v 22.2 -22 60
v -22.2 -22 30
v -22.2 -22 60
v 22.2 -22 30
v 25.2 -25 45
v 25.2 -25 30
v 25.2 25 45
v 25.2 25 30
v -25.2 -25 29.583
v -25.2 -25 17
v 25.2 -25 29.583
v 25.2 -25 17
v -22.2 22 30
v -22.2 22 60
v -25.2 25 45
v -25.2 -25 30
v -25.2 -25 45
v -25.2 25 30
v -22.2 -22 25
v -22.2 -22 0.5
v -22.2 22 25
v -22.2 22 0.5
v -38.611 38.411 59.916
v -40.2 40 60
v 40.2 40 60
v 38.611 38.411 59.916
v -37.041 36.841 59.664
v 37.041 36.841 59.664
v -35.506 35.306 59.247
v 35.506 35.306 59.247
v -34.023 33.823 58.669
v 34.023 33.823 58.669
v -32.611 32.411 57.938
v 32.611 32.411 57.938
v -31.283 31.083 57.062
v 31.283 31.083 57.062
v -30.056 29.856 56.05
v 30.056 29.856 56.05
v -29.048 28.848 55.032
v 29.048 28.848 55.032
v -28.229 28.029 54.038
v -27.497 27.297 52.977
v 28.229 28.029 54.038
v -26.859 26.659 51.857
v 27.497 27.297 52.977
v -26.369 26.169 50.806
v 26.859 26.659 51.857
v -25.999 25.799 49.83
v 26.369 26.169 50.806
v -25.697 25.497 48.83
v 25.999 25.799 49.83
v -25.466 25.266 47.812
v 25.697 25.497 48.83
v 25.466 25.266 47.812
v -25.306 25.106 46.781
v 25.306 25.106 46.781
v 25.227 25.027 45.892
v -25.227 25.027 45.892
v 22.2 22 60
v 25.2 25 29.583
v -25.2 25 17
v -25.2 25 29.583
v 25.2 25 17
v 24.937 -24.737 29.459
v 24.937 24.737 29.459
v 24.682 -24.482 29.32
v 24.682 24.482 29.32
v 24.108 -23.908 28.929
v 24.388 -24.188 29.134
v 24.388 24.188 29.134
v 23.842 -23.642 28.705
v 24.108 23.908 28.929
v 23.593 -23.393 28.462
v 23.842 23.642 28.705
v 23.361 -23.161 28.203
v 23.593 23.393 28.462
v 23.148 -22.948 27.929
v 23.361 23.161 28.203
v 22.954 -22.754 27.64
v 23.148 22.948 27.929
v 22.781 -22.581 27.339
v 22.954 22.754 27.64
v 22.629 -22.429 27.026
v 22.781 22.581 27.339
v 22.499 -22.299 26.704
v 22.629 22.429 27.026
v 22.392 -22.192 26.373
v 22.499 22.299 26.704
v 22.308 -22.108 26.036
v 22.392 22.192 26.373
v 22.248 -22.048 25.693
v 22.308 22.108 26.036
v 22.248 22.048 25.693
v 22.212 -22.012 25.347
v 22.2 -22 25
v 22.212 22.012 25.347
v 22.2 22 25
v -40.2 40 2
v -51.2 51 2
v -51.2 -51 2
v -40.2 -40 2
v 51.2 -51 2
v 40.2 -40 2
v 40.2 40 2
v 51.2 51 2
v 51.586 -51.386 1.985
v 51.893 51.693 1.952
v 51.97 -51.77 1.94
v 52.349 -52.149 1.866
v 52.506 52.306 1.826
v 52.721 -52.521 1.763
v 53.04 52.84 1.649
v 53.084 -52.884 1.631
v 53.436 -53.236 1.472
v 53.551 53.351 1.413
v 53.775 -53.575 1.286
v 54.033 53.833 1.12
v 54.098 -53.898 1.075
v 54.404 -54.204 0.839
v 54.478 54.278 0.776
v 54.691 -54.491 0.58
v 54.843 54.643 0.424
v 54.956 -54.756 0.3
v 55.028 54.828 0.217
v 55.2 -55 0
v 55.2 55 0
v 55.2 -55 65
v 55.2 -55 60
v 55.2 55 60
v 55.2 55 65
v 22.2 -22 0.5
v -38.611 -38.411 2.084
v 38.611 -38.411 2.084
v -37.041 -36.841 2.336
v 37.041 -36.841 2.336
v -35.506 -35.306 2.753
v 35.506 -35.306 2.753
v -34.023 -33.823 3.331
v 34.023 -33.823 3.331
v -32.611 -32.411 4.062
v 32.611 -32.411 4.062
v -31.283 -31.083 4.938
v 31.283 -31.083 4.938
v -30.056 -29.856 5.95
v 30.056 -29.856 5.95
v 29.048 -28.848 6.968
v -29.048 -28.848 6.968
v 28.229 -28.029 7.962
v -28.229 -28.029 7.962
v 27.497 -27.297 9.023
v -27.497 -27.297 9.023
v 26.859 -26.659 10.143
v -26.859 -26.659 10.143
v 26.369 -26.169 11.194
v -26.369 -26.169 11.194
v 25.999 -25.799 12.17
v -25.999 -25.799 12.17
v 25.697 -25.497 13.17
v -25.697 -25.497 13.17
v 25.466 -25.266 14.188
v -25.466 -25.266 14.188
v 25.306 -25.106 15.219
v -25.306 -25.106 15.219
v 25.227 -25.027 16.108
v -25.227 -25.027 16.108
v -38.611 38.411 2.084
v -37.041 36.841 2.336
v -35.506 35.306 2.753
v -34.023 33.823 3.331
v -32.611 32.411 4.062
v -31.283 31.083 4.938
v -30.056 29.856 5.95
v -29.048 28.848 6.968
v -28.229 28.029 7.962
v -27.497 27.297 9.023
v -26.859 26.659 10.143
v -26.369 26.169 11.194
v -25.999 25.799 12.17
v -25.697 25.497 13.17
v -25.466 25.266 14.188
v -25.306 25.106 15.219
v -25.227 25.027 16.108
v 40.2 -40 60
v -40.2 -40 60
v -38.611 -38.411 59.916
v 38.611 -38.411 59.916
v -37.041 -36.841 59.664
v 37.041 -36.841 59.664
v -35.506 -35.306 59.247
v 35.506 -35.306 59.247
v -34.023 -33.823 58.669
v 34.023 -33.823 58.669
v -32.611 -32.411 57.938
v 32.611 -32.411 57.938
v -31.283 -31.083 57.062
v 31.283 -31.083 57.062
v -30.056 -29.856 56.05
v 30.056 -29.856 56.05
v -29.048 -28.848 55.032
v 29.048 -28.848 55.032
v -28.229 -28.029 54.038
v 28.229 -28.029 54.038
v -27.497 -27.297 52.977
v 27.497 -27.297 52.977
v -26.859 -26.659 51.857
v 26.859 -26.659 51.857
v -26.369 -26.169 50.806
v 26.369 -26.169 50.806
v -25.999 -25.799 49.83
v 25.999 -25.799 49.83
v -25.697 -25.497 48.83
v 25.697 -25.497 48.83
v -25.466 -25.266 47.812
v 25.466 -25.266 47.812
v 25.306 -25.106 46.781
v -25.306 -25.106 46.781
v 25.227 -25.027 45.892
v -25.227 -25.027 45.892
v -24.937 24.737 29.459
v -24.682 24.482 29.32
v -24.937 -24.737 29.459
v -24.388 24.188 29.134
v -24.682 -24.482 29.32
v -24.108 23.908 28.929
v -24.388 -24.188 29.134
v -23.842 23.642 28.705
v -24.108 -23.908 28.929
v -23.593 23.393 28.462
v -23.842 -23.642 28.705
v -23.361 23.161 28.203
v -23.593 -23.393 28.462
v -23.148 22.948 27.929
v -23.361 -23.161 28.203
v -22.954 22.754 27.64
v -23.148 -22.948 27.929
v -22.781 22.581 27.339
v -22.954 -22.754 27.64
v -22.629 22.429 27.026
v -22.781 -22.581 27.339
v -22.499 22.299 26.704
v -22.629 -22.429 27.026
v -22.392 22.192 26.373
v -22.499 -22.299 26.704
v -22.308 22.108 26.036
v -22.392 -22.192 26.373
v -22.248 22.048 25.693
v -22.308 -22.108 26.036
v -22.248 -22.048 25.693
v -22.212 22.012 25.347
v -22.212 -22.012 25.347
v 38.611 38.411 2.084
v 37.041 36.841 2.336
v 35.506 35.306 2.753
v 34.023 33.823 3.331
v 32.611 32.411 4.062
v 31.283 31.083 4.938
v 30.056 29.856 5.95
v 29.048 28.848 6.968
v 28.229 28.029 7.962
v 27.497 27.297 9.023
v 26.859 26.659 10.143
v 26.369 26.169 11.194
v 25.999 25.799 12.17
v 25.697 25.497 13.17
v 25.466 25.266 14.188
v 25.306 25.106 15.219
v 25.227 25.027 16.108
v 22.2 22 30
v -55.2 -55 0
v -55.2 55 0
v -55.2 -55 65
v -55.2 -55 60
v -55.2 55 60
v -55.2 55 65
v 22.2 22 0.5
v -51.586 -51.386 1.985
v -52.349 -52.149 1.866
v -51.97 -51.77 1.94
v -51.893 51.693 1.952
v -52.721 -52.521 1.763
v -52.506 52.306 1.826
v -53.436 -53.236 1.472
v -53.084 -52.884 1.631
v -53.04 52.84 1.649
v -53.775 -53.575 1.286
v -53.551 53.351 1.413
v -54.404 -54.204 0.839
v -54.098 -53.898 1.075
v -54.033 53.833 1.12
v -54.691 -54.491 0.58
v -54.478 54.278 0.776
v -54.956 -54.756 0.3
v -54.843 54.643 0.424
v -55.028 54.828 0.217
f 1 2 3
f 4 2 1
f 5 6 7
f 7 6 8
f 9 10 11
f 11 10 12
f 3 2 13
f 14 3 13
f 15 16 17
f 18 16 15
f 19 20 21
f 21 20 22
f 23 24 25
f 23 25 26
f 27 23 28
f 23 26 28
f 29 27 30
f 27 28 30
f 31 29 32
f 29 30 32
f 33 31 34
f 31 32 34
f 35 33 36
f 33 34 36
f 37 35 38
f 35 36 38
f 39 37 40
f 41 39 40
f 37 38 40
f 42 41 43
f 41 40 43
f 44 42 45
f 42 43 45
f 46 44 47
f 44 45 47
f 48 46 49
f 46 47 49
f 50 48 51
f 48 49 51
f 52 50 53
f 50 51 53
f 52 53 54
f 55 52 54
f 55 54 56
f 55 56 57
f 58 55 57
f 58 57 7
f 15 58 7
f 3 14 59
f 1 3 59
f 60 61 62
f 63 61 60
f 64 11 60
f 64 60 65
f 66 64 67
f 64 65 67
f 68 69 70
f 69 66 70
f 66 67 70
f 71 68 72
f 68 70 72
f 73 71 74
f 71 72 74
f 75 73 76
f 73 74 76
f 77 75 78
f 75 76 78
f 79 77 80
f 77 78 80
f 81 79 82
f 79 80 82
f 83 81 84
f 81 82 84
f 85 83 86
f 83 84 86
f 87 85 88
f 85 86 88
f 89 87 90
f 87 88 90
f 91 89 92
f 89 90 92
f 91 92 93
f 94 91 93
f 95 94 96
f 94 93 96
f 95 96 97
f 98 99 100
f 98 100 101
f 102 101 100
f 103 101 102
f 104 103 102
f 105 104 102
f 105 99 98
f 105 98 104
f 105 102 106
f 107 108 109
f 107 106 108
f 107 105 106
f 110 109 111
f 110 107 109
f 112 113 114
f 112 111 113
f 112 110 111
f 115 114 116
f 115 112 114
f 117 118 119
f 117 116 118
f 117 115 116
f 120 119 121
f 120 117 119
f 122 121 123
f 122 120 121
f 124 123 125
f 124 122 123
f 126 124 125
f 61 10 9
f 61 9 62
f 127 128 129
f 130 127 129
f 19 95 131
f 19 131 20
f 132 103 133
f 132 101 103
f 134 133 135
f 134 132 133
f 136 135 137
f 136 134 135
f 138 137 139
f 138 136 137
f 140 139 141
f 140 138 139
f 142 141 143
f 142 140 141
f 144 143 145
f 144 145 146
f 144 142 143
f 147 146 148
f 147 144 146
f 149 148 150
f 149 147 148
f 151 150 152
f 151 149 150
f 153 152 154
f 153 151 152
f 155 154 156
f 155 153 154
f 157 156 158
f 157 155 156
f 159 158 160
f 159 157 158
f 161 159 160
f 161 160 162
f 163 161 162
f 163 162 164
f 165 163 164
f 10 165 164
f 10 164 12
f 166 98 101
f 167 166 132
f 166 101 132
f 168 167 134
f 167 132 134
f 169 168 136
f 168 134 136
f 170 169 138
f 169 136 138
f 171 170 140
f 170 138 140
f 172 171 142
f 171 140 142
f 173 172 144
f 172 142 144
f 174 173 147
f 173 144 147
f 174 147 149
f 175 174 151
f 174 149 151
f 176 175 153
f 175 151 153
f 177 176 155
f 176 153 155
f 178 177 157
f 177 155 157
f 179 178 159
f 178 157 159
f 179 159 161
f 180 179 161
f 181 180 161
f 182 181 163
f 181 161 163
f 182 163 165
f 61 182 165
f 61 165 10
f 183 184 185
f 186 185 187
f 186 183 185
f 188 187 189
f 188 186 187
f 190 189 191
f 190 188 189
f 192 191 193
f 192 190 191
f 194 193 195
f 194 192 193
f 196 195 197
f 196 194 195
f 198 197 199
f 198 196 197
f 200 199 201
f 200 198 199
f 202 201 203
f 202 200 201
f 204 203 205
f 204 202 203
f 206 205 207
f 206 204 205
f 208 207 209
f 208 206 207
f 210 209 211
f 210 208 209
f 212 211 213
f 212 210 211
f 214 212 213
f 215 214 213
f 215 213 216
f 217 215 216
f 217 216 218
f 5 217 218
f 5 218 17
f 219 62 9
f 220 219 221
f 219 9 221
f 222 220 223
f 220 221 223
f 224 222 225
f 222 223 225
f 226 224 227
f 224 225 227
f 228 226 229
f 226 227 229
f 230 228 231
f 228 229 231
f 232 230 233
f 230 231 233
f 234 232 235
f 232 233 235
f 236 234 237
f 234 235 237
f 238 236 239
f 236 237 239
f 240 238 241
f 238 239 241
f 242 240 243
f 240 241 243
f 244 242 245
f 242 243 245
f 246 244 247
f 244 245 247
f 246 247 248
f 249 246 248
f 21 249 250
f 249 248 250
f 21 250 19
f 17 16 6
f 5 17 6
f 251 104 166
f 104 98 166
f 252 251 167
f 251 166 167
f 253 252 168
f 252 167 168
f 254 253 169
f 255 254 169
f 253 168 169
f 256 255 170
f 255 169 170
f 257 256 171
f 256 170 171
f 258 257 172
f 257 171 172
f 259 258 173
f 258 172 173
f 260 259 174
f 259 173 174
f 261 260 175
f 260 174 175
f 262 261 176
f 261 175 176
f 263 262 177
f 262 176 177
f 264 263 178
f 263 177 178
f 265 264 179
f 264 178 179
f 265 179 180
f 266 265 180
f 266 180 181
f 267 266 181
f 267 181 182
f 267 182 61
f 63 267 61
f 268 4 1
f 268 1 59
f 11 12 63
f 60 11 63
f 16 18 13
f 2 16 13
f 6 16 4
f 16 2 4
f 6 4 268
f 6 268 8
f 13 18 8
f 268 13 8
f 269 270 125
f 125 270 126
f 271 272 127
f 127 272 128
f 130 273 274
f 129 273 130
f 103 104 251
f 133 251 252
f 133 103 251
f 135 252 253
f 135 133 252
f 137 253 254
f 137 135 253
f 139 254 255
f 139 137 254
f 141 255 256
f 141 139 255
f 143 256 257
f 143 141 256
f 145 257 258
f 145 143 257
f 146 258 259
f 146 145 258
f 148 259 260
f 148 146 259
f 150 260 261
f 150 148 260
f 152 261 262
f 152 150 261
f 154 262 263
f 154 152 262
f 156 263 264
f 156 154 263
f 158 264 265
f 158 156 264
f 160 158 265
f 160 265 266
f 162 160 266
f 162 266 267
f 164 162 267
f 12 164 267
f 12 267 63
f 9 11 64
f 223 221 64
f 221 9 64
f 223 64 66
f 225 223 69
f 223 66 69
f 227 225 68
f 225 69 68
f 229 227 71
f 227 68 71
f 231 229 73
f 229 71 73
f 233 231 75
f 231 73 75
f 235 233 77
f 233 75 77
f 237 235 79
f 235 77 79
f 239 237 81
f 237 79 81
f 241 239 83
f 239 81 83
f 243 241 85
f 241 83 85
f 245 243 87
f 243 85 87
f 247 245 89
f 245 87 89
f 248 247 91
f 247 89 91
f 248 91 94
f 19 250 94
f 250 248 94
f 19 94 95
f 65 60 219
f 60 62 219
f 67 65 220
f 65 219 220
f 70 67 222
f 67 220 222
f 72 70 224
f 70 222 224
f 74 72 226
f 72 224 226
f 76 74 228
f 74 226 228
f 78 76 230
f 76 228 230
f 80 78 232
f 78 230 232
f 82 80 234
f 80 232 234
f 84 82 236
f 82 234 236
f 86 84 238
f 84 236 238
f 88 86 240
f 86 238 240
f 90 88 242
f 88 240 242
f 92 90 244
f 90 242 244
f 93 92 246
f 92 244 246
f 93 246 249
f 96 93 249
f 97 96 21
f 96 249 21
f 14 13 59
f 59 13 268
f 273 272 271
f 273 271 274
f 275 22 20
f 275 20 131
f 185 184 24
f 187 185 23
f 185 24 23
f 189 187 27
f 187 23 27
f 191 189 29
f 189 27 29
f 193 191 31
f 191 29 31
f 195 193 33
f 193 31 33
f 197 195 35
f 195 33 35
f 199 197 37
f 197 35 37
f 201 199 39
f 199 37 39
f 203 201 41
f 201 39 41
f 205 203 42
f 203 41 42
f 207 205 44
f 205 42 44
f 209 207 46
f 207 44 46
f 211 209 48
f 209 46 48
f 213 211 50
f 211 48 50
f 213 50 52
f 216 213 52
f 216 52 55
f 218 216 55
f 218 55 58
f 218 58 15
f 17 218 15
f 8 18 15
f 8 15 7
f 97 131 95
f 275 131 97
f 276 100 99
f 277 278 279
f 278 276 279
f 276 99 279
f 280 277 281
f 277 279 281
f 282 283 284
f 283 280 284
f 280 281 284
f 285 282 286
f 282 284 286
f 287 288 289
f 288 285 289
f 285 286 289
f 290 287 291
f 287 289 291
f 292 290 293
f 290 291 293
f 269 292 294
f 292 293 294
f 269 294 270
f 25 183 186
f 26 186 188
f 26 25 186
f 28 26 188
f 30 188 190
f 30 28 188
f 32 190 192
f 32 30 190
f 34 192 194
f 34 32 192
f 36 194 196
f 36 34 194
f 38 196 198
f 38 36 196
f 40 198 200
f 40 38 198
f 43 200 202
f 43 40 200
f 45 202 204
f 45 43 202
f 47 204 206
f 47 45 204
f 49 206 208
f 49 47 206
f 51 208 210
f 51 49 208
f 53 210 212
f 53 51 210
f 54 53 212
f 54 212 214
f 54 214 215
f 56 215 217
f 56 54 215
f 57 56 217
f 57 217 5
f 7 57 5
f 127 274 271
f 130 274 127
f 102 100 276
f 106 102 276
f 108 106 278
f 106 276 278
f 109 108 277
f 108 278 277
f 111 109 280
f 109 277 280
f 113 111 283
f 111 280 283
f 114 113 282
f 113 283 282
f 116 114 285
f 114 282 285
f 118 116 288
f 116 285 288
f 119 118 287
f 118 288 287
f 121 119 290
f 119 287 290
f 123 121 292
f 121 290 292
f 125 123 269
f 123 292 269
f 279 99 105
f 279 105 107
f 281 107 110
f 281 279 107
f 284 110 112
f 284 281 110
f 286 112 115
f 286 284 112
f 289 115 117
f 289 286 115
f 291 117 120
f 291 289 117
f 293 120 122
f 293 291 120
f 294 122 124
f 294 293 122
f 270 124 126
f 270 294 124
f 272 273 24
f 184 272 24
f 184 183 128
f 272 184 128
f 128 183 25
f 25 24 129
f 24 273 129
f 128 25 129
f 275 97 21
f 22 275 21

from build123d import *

# Parameters (mm, degrees)
F0_W         = 110.4
F0_H         = 110
F0_W_2       = 50.4
F0_H_2       = 50
F0_W_3       = 44.4
F0_H_3       = 44
F1_DEPTH     = 2
F2_DEPTH     = 30
F3_DEPTH     = 30
F4_DEPTH     = 0.5
F5_START     = 60
F5_DEPTH     = 5
F6_R         = 15
F6_2_R       = 15
F7_T1_DEPTH  = 130.4
F7_T3_DEPTH  = 130
F8_T1_DEPTH  = 44
F8_T3_DEPTH  = 44.4
F8_T9_DEPTH  = 56.9
F8_T15_DEPTH = 56.5
F8_T24_DEPTH = 56.9
F8_T30_DEPTH = 56.5
F8_T39_DEPTH = 56.5
F8_T45_DEPTH = 56.9
F8_T54_DEPTH = 56.9
F8_T60_DEPTH = 56.5


# Not quite as in the source:
# - a fillet or chamfer that OpenCascade refuses, or shapes differently, is made with other operations: its cross-section is extruded or revolved along the edge and cut away or added


with BuildPart() as f1:
    # F0 (on Top) → F1 (new body)
    with BuildSketch(Plane.XY):
        Rectangle(F0_W, F0_H)
        Rectangle(F0_W_2, F0_H_2, mode=Mode.SUBTRACT)
        Rectangle(F0_W_2, F0_H_2)
        Rectangle(F0_W_3, F0_H_3, mode=Mode.SUBTRACT)
    extrude(amount=F1_DEPTH)

    # F0 (on Top) → F2 (join)
    with BuildSketch(Plane.XY):
        Rectangle(F0_W_2, F0_H_2)
        Rectangle(F0_W_3, F0_H_3, mode=Mode.SUBTRACT)
    extrude(amount=F2_DEPTH)


with BuildPart() as f3:
    # F3 (new): a face of the model
    f3_faces = [f1.part.faces().sort_by_distance(p)[0] for p in [
        (24.4900591574, 0, 30),
    ]]
    extrude(f3_faces, amount=F3_DEPTH)

    # F0 (on Top) → F5 (join)
    with BuildSketch(Plane.XY.offset(F5_START)):
        Rectangle(F0_W, F0_H)
        Rectangle(F0_W_2, F0_H_2, mode=Mode.SUBTRACT)
        Rectangle(F0_W_2, F0_H_2)
        Rectangle(F0_W_3, F0_H_3, mode=Mode.SUBTRACT)
        Rectangle(F0_W_3, F0_H_3)
    extrude(amount=F5_DEPTH)

    # F6#2
    f6_2_edges = [f3.edges().sort_by_distance(p)[0] for p in [
        (0, -25, 60),
        (-25.2, 0, 60),
        (0, 25, 60),
        (25.2, 0, 60),
    ]]
    fillet(f6_2_edges, radius=F6_2_R)


with BuildPart() as f1_1:
    add(f1.part)

    # F0 (on Top) → F4 (join)
    with BuildSketch(Plane.XY):
        Rectangle(F0_W_3, F0_H_3)
    extrude(amount=F4_DEPTH)

    # F6
    f6_edges = [f1_1.edges().sort_by_distance(p)[0] for p in [
        (25.2, 0, 2),
        (0, -25, 2),
        (-25.2, 0, 2),
        (0, 25, 2),
    ]]
    fillet(f6_edges, radius=F6_R)

    # F7: fillet of radius 5 on 4 edges, made by hand

    # F7_s2 → F7_t1 (cut)
    with BuildSketch(Plane.YZ.offset(-65.2)):
        with BuildLine():
            ThreePointArc((51, 2), (53.2360679775, 1.472135955), (55, 0))
            Line((55, 0), (55, 2))
            Line((55, 2), (51, 2))
        make_face()
        with BuildLine():
            ThreePointArc((-51, 2), (-53.2360679775, 1.472135955), (-55, 0))
            Line((-55, 0), (-55, 2))
            Line((-55, 2), (-51, 2))
        make_face()
    extrude(amount=F7_T1_DEPTH, mode=Mode.SUBTRACT)

    # F7_s4 → F7_t3 (cut)
    with BuildSketch(Plane.XZ.offset(-65)):
        with BuildLine():
            ThreePointArc((51.2, 2), (53.4360679775, 1.472135955), (55.2, 0))
            Line((55.2, 0), (55.2, 2))
            Line((55.2, 2), (51.2, 2))
        make_face()
        with BuildLine():
            ThreePointArc((-51.2, 2), (-53.4360679775, 1.472135955), (-55.2, 0))
            Line((-55.2, 0), (-55.2, 2))
            Line((-55.2, 2), (-51.2, 2))
        make_face()
    extrude(amount=F7_T3_DEPTH, mode=Mode.SUBTRACT)

    # F8: fillet of radius 5 on 4 edges, made by hand

    # F8_s2 → F8_t1 (cut)
    with BuildSketch(Plane.XZ.offset(-22)):
        with BuildLine():
            ThreePointArc((-27.2, 30), (-23.6644660941, 28.5355339059), (-22.2, 25))
            Line((-22.2, 25), (-22.2, 30))
            Line((-22.2, 30), (-27.2, 30))
        make_face()
        with BuildLine():
            ThreePointArc((27.2, 30), (23.6644660941, 28.5355339059), (22.2, 25))
            Line((22.2, 25), (22.2, 30))
            Line((22.2, 30), (27.2, 30))
        make_face()
    extrude(amount=F8_T1_DEPTH, mode=Mode.SUBTRACT)

    # F8_s4 → F8_t3 (cut)
    with BuildSketch(Plane.YZ.offset(-22.2)):
        with BuildLine():
            ThreePointArc((-27, 30), (-23.4644660941, 28.5355339059), (-22, 25))
            Line((-22, 25), (-22, 30))
            Line((-22, 30), (-27, 30))
        make_face()
        with BuildLine():
            ThreePointArc((27, 30), (23.4644660941, 28.5355339059), (22, 25))
            Line((22, 25), (22, 30))
            Line((22, 30), (27, 30))
        make_face()
    extrude(amount=F8_T3_DEPTH, mode=Mode.SUBTRACT)


with BuildPart() as f8_tool7:
    # F8_s8 → F8_t9 (new body)
    with BuildSketch(Plane.YZ.offset(22.2)):
        with BuildLine():
            ThreePointArc((-27, 30), (-23.4644660941, 28.5355339059), (-22, 25))
            Line((-22, 25), (-22, 30))
            Line((-22, 30), (-27, 30))
        make_face()
    extrude(amount=-F8_T9_DEPTH)

    split(bisect_by=Plane.XZ.offset(25), keep=Keep.BOTTOM)

    split(bisect_by=Plane.YZ.offset(-25.2), keep=Keep.TOP)

    split(bisect_by=Plane.YZ.offset(-22.2), keep=Keep.BOTTOM)


with BuildPart() as f8_tool13:
    # F8_s14 → F8_t15 (new body)
    with BuildSketch(Plane.XZ.offset(34.5)):
        with BuildLine():
            ThreePointArc((-27.2, 30), (-23.6644660941, 28.5355339059), (-22.2, 25))
            Line((-22.2, 25), (-22.2, 30))
            Line((-22.2, 30), (-27.2, 30))
        make_face()
    extrude(amount=-F8_T15_DEPTH)

    split(bisect_by=Plane.XZ.offset(25), keep=Keep.BOTTOM)

    split(bisect_by=Plane.YZ.offset(-25.2), keep=Keep.TOP)

    split(bisect_by=Plane.XZ.offset(22), keep=Keep.TOP)


with BuildPart() as f8_tool7_1:
    add(f8_tool7.part)

    # F8_t19: intersect F8_tool13
    add(f8_tool13.part, mode=Mode.INTERSECT)


with BuildPart() as f1_2:
    add(f1_1.part)

    # F8_t5: cut F8_tool7
    add(f8_tool7_1.part, mode=Mode.SUBTRACT)


with BuildPart() as f8_tool22:
    # F8_s23 → F8_t24 (new body)
    with BuildSketch(Plane.YZ.offset(-34.7)):
        with BuildLine():
            ThreePointArc((27, 30), (23.4644660941, 28.5355339059), (22, 25))
            Line((22, 25), (22, 30))
            Line((22, 30), (27, 30))
        make_face()
    extrude(amount=F8_T24_DEPTH)

    split(bisect_by=Plane.XZ.offset(-25), keep=Keep.TOP)

    split(bisect_by=Plane.YZ.offset(-25.2), keep=Keep.TOP)

    split(bisect_by=Plane.YZ.offset(-22.2), keep=Keep.BOTTOM)


with BuildPart() as f8_tool28:
    # F8_s29 → F8_t30 (new body)
    with BuildSketch(Plane.XZ.offset(22)):
        with BuildLine():
            ThreePointArc((-27.2, 30), (-23.6644660941, 28.5355339059), (-22.2, 25))
            Line((-22.2, 25), (-22.2, 30))
            Line((-22.2, 30), (-27.2, 30))
        make_face()
    extrude(amount=-F8_T30_DEPTH)

    split(bisect_by=Plane.XZ.offset(-25), keep=Keep.TOP)

    split(bisect_by=Plane.YZ.offset(-25.2), keep=Keep.TOP)

    split(bisect_by=Plane.XZ.offset(-22), keep=Keep.BOTTOM)


with BuildPart() as f8_tool22_1:
    add(f8_tool22.part)

    # F8_t34: intersect F8_tool28
    add(f8_tool28.part, mode=Mode.INTERSECT)


with BuildPart() as f1_3:
    add(f1_2.part)

    # F8_t20: cut F8_tool22
    add(f8_tool22_1.part, mode=Mode.SUBTRACT)


with BuildPart() as f8_tool37:
    # F8_s38 → F8_t39 (new body)
    with BuildSketch(Plane.XZ.offset(-22)):
        with BuildLine():
            ThreePointArc((27.2, 30), (23.6644660941, 28.5355339059), (22.2, 25))
            Line((22.2, 25), (22.2, 30))
            Line((22.2, 30), (27.2, 30))
        make_face()
    extrude(amount=F8_T39_DEPTH)

    split(bisect_by=Plane.YZ.offset(25.2), keep=Keep.BOTTOM)

    split(bisect_by=Plane.XZ.offset(25), keep=Keep.BOTTOM)

    split(bisect_by=Plane.XZ.offset(22), keep=Keep.TOP)


with BuildPart() as f8_tool43:
    # F8_s44 → F8_t45 (new body)
    with BuildSketch(Plane.YZ.offset(34.7)):
        with BuildLine():
            ThreePointArc((-27, 30), (-23.4644660941, 28.5355339059), (-22, 25))
            Line((-22, 25), (-22, 30))
            Line((-22, 30), (-27, 30))
        make_face()
    extrude(amount=-F8_T45_DEPTH)

    split(bisect_by=Plane.YZ.offset(25.2), keep=Keep.BOTTOM)

    split(bisect_by=Plane.XZ.offset(25), keep=Keep.BOTTOM)

    split(bisect_by=Plane.YZ.offset(22.2), keep=Keep.TOP)


with BuildPart() as f8_tool37_1:
    add(f8_tool37.part)

    # F8_t49: intersect F8_tool43
    add(f8_tool43.part, mode=Mode.INTERSECT)


with BuildPart() as f1_4:
    add(f1_3.part)

    # F8_t35: cut F8_tool37
    add(f8_tool37_1.part, mode=Mode.SUBTRACT)


with BuildPart() as f8_tool52:
    # F8_s53 → F8_t54 (new body)
    with BuildSketch(Plane.YZ.offset(-22.2)):
        with BuildLine():
            ThreePointArc((27, 30), (23.4644660941, 28.5355339059), (22, 25))
            Line((22, 25), (22, 30))
            Line((22, 30), (27, 30))
        make_face()
    extrude(amount=F8_T54_DEPTH)

    split(bisect_by=Plane.YZ.offset(25.2), keep=Keep.BOTTOM)

    split(bisect_by=Plane.XZ.offset(-25), keep=Keep.TOP)

    split(bisect_by=Plane.YZ.offset(22.2), keep=Keep.TOP)


with BuildPart() as f8_tool58:
    # F8_s59 → F8_t60 (new body)
    with BuildSketch(Plane.XZ.offset(-34.5)):
        with BuildLine():
            ThreePointArc((27.2, 30), (23.6644660941, 28.5355339059), (22.2, 25))
            Line((22.2, 25), (22.2, 30))
            Line((22.2, 30), (27.2, 30))
        make_face()
    extrude(amount=F8_T60_DEPTH)

    split(bisect_by=Plane.YZ.offset(25.2), keep=Keep.BOTTOM)

    split(bisect_by=Plane.XZ.offset(-25), keep=Keep.TOP)

    split(bisect_by=Plane.XZ.offset(-22), keep=Keep.BOTTOM)


with BuildPart() as f8_tool52_1:
    add(f8_tool52.part)

    # F8_t64: intersect F8_tool58
    add(f8_tool58.part, mode=Mode.INTERSECT)


with BuildPart() as f1_5:
    add(f1_4.part)

    # F8_t50: cut F8_tool52
    add(f8_tool52_1.part, mode=Mode.SUBTRACT)


solid = Compound([f3.part, f1_5.part])
